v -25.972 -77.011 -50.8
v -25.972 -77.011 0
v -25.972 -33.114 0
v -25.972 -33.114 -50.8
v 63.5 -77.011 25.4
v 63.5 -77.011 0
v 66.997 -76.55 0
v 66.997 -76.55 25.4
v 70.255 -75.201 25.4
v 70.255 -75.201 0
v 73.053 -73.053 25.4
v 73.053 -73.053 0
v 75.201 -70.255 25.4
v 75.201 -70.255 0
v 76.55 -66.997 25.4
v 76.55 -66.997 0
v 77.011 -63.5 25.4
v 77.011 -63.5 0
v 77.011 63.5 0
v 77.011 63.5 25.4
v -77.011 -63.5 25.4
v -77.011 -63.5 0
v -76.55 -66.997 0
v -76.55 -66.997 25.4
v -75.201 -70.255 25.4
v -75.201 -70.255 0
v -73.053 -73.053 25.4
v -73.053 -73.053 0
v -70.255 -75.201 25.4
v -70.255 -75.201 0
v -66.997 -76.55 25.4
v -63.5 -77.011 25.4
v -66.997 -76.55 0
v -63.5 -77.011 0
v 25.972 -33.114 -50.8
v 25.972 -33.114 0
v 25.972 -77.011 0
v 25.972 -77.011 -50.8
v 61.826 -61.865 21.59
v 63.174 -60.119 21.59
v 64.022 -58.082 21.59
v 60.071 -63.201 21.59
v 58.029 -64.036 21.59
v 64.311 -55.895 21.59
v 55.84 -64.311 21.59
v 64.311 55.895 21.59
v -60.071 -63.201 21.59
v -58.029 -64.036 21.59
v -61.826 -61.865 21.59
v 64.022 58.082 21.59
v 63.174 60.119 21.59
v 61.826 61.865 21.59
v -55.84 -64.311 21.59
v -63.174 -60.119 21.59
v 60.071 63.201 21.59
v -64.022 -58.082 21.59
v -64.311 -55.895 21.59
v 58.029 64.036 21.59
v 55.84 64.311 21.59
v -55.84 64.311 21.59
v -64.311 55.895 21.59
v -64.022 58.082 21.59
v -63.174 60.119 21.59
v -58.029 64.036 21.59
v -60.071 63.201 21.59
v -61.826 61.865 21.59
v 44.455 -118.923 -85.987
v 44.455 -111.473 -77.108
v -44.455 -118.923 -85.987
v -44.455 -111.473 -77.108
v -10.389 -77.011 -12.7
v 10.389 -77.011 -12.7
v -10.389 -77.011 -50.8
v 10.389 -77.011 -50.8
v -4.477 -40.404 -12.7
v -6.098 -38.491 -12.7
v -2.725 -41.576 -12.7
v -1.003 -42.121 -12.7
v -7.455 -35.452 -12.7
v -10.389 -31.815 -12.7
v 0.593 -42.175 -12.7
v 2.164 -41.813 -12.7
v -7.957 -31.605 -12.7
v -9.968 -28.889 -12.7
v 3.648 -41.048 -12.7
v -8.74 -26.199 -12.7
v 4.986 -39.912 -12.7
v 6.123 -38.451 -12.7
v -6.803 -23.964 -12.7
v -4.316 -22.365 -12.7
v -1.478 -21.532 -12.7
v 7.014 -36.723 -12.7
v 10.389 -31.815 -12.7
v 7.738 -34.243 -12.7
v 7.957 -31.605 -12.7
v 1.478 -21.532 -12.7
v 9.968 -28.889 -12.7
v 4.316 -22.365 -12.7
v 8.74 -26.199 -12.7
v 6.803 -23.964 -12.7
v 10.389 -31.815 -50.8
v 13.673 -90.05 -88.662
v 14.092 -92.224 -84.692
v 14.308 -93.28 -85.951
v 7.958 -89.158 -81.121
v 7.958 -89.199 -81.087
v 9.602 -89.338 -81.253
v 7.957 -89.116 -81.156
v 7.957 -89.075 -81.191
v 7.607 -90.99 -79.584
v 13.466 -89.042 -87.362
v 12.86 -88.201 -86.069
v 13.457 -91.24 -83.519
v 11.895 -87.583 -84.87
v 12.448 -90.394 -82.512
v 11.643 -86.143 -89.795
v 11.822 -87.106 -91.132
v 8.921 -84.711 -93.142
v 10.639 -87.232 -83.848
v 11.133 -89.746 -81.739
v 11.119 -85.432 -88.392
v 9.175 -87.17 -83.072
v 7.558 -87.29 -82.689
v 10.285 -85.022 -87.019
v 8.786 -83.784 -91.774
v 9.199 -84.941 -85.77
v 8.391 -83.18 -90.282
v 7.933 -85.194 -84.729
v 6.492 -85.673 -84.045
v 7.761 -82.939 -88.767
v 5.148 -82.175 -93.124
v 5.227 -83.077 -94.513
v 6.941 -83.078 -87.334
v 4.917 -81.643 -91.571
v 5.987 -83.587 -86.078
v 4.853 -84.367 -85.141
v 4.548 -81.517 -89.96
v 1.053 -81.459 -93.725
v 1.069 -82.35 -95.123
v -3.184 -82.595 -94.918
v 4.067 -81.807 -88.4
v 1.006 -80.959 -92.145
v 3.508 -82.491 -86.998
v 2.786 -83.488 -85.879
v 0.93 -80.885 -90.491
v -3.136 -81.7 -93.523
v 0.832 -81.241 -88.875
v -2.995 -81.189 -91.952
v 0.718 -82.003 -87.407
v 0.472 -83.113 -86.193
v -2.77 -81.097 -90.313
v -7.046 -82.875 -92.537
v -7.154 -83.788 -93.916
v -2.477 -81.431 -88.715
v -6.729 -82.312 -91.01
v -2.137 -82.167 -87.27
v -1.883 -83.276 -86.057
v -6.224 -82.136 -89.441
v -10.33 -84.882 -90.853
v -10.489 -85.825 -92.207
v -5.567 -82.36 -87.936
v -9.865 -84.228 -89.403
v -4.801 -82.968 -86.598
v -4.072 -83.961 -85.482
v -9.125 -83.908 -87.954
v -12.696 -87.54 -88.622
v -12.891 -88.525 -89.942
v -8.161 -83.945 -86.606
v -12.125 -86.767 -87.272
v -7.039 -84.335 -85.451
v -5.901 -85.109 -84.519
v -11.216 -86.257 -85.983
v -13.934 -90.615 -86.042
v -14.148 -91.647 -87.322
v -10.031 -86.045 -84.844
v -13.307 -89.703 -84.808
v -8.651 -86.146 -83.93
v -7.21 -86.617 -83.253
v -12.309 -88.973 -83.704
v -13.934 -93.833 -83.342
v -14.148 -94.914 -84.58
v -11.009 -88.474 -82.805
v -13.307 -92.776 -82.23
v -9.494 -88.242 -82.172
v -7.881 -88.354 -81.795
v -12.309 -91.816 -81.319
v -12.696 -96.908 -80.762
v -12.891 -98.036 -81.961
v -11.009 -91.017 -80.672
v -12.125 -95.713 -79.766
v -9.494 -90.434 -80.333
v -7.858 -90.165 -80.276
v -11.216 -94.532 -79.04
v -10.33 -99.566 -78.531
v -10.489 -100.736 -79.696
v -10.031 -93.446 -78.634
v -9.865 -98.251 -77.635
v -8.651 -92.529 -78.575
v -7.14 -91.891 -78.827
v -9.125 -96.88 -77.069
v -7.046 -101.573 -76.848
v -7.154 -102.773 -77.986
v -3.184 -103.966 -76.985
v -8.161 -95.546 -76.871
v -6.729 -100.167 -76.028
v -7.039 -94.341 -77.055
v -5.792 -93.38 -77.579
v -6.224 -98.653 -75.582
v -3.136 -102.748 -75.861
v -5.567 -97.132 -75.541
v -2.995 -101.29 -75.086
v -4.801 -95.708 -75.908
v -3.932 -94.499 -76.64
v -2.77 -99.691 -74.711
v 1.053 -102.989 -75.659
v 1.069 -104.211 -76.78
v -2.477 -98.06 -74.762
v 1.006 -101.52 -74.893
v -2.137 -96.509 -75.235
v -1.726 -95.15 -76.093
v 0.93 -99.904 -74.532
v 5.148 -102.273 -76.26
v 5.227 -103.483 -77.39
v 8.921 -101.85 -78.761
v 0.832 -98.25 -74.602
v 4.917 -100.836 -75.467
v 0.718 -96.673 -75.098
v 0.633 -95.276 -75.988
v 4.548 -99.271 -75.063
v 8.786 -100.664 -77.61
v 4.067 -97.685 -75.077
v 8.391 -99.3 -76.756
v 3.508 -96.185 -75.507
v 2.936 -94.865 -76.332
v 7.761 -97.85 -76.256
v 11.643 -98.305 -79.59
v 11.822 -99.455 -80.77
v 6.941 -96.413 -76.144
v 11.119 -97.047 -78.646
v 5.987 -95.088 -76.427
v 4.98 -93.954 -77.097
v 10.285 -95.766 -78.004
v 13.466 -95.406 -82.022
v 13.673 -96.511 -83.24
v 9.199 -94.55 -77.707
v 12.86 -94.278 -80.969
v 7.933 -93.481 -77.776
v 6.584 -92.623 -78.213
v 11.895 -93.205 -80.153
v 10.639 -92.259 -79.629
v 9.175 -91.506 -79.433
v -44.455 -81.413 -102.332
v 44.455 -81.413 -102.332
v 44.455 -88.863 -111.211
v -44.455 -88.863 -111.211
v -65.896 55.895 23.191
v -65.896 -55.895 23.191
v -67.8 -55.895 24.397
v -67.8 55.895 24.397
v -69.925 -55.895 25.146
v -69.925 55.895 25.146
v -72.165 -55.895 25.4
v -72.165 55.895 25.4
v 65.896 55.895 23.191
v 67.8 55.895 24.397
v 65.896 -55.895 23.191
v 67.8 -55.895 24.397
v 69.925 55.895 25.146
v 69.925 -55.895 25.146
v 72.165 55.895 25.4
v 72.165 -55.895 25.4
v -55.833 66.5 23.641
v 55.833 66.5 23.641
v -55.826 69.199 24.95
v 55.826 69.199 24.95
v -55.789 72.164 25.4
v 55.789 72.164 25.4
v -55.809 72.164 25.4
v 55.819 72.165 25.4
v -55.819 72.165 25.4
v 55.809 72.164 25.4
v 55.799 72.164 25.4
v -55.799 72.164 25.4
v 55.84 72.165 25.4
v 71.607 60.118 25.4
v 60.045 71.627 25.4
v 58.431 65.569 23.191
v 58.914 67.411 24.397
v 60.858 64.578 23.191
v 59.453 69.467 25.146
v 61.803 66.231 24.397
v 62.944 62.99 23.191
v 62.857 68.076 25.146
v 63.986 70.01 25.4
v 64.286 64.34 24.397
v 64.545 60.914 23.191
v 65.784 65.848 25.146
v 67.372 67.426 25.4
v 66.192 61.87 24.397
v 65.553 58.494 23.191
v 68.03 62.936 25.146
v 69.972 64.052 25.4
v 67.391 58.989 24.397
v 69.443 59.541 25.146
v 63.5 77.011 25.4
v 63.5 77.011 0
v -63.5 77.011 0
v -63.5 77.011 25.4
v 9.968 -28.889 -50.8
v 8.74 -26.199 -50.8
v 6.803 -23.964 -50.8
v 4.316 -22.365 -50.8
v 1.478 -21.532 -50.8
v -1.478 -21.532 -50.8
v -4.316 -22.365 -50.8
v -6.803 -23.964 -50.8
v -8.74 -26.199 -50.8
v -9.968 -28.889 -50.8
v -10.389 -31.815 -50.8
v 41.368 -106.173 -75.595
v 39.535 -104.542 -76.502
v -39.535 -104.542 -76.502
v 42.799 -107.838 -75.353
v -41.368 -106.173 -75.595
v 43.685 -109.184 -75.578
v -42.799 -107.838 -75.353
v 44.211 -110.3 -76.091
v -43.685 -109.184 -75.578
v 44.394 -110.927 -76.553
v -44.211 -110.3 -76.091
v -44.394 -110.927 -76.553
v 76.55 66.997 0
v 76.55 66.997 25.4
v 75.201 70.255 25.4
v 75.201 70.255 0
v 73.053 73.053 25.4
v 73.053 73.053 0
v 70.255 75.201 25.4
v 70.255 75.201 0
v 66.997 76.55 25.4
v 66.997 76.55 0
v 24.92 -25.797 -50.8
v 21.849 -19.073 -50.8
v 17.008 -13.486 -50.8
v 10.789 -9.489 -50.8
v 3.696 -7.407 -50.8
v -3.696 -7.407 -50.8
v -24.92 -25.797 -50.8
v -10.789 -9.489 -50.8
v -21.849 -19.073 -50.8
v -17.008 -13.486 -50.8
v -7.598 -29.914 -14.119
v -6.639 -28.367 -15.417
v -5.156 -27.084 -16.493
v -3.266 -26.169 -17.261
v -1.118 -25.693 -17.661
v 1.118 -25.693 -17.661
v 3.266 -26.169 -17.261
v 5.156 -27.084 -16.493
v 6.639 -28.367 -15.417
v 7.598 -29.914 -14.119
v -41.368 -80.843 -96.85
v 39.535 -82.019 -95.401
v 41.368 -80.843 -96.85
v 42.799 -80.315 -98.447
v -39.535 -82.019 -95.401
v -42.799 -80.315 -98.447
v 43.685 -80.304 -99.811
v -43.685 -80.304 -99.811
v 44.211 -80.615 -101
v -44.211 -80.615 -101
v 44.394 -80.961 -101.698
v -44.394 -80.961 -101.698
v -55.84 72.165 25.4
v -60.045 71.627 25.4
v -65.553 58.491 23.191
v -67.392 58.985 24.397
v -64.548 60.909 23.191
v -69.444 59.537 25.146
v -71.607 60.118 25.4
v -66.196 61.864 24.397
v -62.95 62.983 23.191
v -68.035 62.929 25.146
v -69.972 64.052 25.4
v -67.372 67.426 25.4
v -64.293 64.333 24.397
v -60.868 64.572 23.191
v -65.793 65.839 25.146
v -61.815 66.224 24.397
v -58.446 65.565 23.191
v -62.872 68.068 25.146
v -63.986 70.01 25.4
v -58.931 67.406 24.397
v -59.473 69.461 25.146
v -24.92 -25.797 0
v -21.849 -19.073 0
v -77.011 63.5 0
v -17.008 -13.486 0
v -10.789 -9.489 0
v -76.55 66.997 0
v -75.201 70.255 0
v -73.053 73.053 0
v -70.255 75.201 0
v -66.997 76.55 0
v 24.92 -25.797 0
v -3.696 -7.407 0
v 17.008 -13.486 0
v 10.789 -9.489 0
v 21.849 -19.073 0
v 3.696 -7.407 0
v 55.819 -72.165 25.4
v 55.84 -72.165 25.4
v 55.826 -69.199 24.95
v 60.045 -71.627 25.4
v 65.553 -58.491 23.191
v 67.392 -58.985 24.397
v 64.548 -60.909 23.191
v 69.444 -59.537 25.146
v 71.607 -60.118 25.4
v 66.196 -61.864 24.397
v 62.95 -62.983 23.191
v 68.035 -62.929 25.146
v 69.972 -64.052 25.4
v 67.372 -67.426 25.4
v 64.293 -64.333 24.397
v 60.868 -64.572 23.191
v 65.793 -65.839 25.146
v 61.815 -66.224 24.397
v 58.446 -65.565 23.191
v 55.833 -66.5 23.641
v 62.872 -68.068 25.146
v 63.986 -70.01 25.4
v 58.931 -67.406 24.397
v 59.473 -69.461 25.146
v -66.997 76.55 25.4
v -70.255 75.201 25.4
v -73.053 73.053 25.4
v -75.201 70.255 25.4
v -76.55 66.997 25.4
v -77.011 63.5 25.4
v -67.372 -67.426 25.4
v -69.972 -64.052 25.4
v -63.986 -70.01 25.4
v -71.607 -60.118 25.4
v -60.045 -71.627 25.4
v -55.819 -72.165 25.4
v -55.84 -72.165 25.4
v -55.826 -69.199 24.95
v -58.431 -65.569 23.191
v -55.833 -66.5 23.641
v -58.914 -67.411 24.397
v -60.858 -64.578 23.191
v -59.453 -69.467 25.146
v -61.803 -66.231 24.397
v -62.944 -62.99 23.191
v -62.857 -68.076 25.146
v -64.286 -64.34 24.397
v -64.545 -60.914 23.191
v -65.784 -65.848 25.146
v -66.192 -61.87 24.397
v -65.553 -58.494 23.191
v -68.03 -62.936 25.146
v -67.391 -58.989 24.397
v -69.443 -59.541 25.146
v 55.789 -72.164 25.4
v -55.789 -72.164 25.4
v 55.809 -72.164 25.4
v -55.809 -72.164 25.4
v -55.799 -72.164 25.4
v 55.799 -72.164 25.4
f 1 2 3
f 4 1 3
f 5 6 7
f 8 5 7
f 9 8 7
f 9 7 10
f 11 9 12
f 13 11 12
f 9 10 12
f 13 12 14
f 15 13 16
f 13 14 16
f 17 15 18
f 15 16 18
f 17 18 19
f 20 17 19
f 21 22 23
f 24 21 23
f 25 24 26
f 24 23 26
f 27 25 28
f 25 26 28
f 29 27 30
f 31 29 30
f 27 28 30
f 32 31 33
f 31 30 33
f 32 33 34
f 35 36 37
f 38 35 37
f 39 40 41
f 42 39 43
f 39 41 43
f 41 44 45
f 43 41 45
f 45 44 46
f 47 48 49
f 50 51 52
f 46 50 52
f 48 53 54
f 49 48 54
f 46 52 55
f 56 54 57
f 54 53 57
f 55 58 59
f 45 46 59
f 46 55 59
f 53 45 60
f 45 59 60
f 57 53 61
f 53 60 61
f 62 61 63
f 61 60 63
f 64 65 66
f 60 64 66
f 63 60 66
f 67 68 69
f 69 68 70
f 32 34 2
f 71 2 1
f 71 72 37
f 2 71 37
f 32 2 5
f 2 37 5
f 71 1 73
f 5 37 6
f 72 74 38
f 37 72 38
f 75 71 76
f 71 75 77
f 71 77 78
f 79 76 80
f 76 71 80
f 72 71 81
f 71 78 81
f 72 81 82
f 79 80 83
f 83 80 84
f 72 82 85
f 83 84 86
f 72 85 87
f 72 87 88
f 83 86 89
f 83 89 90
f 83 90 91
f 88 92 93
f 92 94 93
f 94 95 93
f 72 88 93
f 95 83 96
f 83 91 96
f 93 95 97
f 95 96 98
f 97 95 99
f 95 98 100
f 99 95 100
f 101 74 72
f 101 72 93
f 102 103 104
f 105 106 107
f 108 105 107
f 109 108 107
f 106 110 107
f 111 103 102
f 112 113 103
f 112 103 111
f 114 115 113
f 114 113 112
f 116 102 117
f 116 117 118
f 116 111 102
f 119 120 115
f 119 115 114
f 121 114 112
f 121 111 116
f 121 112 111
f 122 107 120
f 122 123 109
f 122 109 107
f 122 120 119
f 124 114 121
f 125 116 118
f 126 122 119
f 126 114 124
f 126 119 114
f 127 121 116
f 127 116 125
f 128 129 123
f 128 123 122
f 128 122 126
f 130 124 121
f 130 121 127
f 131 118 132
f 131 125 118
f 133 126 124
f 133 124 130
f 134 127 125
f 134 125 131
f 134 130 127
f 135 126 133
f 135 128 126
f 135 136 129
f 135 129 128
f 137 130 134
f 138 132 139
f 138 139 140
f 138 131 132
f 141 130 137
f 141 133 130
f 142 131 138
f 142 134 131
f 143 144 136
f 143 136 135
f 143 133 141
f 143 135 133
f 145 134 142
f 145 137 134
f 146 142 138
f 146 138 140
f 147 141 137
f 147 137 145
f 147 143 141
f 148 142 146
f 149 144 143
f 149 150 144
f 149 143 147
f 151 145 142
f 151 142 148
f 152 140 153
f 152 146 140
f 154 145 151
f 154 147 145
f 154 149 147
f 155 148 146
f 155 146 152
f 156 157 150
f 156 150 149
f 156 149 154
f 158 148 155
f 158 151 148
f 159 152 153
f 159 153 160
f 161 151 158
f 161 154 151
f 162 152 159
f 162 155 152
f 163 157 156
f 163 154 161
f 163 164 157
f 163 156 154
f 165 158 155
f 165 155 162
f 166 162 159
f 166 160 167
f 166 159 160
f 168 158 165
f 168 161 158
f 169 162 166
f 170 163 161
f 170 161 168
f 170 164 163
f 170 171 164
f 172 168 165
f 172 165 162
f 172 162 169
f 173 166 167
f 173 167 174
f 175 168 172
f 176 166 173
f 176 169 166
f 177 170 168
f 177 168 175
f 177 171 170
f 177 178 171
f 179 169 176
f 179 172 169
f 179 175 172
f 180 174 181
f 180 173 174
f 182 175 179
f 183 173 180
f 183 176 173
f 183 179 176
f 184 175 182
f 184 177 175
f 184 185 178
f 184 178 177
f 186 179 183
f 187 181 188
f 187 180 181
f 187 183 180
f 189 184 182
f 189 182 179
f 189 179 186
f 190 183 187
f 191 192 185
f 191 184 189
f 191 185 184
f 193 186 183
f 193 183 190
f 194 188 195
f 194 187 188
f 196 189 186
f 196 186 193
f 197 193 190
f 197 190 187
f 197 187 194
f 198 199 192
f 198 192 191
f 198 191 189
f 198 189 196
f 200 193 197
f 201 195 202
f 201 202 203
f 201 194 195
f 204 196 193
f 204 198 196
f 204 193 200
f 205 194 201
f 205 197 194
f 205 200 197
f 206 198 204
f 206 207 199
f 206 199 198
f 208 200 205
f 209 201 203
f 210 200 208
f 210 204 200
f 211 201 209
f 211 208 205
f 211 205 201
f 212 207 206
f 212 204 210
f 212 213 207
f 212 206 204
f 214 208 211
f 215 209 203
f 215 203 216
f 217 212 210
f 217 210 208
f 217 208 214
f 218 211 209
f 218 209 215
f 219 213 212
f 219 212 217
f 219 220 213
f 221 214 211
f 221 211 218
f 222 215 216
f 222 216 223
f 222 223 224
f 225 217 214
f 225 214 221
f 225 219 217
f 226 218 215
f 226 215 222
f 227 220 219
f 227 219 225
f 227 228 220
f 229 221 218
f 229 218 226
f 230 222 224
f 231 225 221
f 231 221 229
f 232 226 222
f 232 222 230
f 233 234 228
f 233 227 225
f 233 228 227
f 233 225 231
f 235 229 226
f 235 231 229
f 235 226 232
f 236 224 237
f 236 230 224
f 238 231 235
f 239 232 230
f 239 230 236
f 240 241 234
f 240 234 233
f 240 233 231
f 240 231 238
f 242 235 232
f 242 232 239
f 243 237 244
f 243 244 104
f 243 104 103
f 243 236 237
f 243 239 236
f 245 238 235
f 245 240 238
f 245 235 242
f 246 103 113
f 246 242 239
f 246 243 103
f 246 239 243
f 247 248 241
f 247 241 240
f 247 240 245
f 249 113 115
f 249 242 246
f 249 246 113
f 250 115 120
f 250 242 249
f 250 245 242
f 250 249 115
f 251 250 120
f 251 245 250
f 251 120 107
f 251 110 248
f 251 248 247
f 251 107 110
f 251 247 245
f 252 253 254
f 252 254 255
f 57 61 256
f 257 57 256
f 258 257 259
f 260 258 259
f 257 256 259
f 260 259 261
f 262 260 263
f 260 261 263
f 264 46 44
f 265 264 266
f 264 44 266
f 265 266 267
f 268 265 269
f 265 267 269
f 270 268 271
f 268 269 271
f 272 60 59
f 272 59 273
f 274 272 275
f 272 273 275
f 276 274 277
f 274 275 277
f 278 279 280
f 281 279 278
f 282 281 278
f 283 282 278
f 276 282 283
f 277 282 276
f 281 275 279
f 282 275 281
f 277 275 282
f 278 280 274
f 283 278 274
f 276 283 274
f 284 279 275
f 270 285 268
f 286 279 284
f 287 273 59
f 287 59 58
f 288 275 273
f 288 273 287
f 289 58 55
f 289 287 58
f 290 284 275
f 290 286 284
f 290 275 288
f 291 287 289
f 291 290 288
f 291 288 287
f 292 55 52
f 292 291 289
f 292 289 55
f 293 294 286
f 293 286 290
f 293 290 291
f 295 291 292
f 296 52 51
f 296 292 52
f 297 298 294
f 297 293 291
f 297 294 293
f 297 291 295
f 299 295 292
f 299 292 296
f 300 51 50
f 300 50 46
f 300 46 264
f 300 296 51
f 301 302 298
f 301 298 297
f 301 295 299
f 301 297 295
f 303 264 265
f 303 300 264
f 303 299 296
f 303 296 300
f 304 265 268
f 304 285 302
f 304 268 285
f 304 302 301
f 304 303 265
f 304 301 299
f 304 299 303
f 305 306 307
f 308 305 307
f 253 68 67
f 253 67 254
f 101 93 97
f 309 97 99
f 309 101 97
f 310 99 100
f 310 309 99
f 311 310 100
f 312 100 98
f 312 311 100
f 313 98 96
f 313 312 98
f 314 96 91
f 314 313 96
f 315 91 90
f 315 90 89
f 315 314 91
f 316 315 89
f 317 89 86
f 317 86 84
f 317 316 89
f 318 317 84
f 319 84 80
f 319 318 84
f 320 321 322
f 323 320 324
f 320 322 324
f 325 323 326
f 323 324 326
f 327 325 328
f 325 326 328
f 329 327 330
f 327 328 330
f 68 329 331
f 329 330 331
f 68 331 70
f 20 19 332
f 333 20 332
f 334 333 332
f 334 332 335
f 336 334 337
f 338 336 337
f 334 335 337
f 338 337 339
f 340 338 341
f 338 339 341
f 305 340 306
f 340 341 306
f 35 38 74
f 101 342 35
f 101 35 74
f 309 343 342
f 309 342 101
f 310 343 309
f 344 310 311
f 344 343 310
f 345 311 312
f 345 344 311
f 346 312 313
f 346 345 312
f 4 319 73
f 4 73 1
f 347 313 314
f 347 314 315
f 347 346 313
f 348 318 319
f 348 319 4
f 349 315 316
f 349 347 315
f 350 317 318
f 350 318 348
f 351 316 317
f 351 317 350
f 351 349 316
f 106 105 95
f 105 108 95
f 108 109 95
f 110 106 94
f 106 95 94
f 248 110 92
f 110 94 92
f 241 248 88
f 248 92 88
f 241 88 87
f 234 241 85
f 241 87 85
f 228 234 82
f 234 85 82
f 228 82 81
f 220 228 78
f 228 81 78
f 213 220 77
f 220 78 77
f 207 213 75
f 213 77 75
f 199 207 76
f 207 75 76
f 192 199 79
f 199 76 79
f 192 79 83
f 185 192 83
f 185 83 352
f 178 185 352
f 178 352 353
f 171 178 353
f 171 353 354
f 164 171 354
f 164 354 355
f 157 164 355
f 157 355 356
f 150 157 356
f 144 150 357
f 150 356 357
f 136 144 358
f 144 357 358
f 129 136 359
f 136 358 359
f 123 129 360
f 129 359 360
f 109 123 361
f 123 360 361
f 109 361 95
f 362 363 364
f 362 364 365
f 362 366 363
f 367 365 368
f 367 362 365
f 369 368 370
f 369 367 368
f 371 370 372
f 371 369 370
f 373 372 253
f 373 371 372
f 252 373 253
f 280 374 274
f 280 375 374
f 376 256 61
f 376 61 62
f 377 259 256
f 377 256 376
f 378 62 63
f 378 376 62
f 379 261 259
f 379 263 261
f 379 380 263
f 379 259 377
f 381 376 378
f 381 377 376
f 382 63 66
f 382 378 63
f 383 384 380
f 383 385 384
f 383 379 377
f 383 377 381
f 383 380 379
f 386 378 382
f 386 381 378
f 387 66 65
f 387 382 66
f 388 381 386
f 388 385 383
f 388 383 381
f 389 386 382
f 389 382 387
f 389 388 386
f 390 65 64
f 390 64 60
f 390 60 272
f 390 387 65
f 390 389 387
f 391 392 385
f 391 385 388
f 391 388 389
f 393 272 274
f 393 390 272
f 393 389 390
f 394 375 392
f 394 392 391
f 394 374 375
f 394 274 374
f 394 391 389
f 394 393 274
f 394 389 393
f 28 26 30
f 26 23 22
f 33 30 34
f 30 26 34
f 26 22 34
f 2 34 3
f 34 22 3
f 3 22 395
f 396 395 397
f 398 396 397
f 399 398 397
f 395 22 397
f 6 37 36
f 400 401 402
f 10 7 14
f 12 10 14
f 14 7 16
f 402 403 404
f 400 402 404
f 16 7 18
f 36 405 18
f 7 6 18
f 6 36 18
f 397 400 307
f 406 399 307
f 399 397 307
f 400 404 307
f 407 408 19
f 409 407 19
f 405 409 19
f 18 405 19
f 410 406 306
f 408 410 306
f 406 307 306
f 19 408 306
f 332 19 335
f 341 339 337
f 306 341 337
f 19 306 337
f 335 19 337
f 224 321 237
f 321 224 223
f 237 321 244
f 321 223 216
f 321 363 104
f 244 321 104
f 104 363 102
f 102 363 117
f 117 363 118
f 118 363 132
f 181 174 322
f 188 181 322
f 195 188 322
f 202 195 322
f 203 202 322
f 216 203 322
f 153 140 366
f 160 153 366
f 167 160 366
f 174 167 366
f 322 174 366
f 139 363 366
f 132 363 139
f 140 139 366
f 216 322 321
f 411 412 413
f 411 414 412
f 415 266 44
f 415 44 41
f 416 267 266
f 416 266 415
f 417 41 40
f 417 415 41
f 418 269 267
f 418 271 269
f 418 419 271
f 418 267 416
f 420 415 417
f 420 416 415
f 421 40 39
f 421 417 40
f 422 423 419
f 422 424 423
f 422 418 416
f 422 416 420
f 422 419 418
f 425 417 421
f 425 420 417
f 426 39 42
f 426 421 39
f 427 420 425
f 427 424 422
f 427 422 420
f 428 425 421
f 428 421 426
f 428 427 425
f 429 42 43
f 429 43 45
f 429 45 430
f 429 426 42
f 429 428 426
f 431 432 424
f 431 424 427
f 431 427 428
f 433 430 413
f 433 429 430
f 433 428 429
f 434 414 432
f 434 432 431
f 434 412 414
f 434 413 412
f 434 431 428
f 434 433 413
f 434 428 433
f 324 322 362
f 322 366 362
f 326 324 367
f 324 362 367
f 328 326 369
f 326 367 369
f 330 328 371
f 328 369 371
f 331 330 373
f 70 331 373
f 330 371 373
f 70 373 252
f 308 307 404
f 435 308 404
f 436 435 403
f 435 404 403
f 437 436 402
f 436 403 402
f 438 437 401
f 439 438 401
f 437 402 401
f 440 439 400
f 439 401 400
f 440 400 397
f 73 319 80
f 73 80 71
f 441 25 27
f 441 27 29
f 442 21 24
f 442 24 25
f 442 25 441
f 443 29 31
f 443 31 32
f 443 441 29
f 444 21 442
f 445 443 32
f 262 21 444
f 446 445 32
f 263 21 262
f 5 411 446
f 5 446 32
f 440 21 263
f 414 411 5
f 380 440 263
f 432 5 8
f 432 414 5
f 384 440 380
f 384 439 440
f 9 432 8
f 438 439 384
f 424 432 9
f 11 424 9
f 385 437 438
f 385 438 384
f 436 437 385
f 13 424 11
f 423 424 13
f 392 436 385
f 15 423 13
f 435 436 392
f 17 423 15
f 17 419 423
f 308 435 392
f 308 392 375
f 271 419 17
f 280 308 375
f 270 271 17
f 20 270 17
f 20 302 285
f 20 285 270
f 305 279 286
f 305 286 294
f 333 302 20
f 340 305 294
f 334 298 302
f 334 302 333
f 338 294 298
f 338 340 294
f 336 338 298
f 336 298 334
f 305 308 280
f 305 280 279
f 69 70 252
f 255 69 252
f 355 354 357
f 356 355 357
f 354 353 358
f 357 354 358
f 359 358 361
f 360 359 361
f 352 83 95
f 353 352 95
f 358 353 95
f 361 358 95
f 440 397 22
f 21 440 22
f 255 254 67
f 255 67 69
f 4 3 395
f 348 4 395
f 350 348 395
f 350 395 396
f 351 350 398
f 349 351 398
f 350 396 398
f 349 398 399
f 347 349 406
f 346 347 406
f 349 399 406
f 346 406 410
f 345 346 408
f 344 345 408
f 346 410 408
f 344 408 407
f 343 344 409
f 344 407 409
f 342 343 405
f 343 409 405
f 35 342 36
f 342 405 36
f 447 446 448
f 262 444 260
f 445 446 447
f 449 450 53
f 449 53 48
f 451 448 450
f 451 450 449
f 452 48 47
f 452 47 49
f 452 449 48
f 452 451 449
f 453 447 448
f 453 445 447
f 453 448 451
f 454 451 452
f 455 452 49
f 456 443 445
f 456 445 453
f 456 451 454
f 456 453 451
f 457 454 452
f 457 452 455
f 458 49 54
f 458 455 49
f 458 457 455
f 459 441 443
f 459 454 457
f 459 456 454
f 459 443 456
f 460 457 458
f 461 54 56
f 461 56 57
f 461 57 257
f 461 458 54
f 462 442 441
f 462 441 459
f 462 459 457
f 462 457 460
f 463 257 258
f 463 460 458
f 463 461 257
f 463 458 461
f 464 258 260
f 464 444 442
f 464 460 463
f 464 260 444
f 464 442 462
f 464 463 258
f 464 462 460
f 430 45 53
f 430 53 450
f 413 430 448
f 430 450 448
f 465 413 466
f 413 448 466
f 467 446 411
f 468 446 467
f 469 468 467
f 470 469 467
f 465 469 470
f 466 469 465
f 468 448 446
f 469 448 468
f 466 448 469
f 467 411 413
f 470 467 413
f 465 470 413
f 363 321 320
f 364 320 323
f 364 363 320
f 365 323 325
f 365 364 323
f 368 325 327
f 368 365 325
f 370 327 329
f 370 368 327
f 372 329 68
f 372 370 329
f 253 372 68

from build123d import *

# Parameters (mm, degrees)
BOSS_EXTRUDE1_DEPTH     = 25.4
CUT_EXTRUDE1_DEPTH      = 0.25399999999999945
CUT_EXTRUDE1_DEPTH_BACK = 3.8099999999999814
BOSS_EXTRUDE3_DEPTH     = 50.8
CUT_EXTRUDE3_DEPTH      = 38.1
SKETCH9_R               = 7.958201772862371
BOSS_EXTRUDE4_DEPTH     = 95.75799999999995
SKETCH11_W              = 88.91089611657237
SKETCH11_H              = 39.241441418777725
BOSS_EXTRUDE5_DEPTH     = 16.509999999999938
FILLET2_R               = 10
FILLET3_R               = 4.919999999999999


# Read off the part's stored shape, not the designer's step: Sweep1
with BuildPart() as part:
    # Sketch1 → Boss-Extrude1 (new body)
    with BuildSketch(Plane.XY):
        with BuildLine():
            Line((63.5, 77.01063829787236), (-63.5, 77.01063829787236))
            ThreePointArc((-63.5, 77.01063829787236), (-73.05346395858422, 73.05346395858422), (-77.01063829787236, 63.5))
            Line((-77.01063829787236, 63.5), (-77.01063829787236, -63.5))
            ThreePointArc((-77.01063829787236, -63.5), (-73.05346395858422, -73.05346395858422), (-63.5, -77.01063829787236))
            Line((-63.5, -77.01063829787236), (63.5, -77.01063829787236))
            ThreePointArc((63.5, -77.01063829787236), (73.05346395858422, -73.05346395858423), (77.01063829787236, -63.500000000000014))
            Line((77.01063829787236, -63.500000000000014), (77.01063829787236, 63.500000000000014))
            ThreePointArc((77.01063829787236, 63.500000000000014), (73.05346395858422, 73.05346395858423), (63.5, 77.01063829787236))
        make_face()
    extrude(amount=BOSS_EXTRUDE1_DEPTH)

    # Sketch3 → Cut-Extrude1 (cut, two sides: drawn at the far end of the back side and taken through both)
    with BuildSketch(Plane.XY.offset(25.4).offset(-CUT_EXTRUDE1_DEPTH_BACK)):
        with BuildLine():
            Line((-64.31063829787236, -55.89490495185724), (-64.31063829787236, 55.89490495185724))
            ThreePointArc((-64.31063829787236, 55.89490495185724), (-61.826342998624284, 61.86512188051967), (-55.84013695793273, 64.31063829787234))
            Line((-55.84013695793273, 64.31063829787234), (55.84013695793273, 64.31063829787234))
            ThreePointArc((55.84013695793273, 64.31063829787234), (61.826342998624284, 61.86512188051967), (64.31063829787236, 55.89490495185724))
            Line((64.31063829787236, 55.89490495185724), (64.31063829787236, -55.89490495185724))
            ThreePointArc((64.31063829787236, -55.89490495185724), (61.826342998624284, -61.86512188051967), (55.84013695793273, -64.31063829787234))
            Line((55.84013695793273, -64.31063829787234), (-55.84013695793273, -64.31063829787234))
            ThreePointArc((-55.84013695793273, -64.31063829787234), (-61.826342998624284, -61.86512188051967), (-64.31063829787236, -55.89490495185724))
        make_face()
    extrude(amount=CUT_EXTRUDE1_DEPTH + CUT_EXTRUDE1_DEPTH_BACK, mode=Mode.SUBTRACT)

    # Sketch7 → Boss-Extrude3 (add)
    with BuildSketch(Plane(origin=(0, 0, 0), x_dir=(-1, 0, 0), z_dir=(0, 0, -1))):
        with BuildLine():
            Line((-25.971736510678774, -77.01063829787236), (25.971736510678774, -77.0106382978723))
            Line((25.971736510678774, -77.0106382978723), (25.971736510678774, -33.11396405111534))
            ThreePointArc((25.971736510678774, -33.11396405111534), (-4.77e-15, -7.142227540436579), (-25.971736510678774, -33.11396405111537))
            Line((-25.971736510678774, -33.11396405111537), (-25.971736510678774, -77.01063829787236))
        make_face()
    extrude(amount=BOSS_EXTRUDE3_DEPTH)

    # Sketch8 → Cut-Extrude3 (cut)
    with BuildSketch(Plane(origin=(0, 0, -50.8), x_dir=(-1, 0, 0), z_dir=(0, 0, -1))):
        with BuildLine():
            Line((-10.388694604271498, -77.01063829787235), (-10.388694604271498, -31.815377225581233))
            ThreePointArc((-10.388694604271498, -31.815377225581233), (6.4e-16, -21.426682621309737), (10.388694604271498, -31.815377225581233))
            Line((10.388694604271498, -31.815377225581233), (10.388694604271498, -77.01063829787235))
            Line((10.388694604271498, -77.01063829787235), (-10.388694604271498, -77.01063829787235))
        make_face()
    extrude(amount=-CUT_EXTRUDE3_DEPTH, mode=Mode.SUBTRACT)

    # Sketch9 → Boss-Extrude4 (add)
    with BuildSketch(Plane(origin=(0, -19.311882184983943, -23.015004973711303), x_dir=(1, 0, 0), z_dir=(0, -0.6427876096865301, -0.7660444431189859))):
        with Locations(Location((0, 16.20859028637191, 0), (0, 0, 358.83868965))):
            Circle(SKETCH9_R)
    extrude(amount=BOSS_EXTRUDE4_DEPTH)



with BuildPart() as body_2:
    # Sketch11 → Boss-Extrude5 (new body)
    with BuildSketch(Plane(origin=(0, -80.86393811334668, -96.36988875789913), x_dir=(-1, 0, 0), z_dir=(0, -0.64278760968653, -0.766044443118986))):
        with Locations((0, -16.2085902863719)):
            Rectangle(SKETCH11_W, SKETCH11_H)
    extrude(amount=BOSS_EXTRUDE5_DEPTH)


with BuildPart() as part_1:
    add(part.part)

    add(body_2.part)  # Sweep1 merges body 2
    # Sweep1 outline → Sweep1 (revolve)
    with BuildSketch(Plane(origin=(0, -12.41650052, 10.418681007), x_dir=(1, 0, 0), z_dir=(0, -0.766044443118986, 0.64278760968653))):
        with BuildLine():
            ThreePointArc((14.308201773, -125.801955257), (12.448329834, -121.311827197), (7.958201773, -119.451955257))
            Line((7.958201773, -119.451955257), (7.958201773, -125.801955257))
            Line((7.958201773, -125.801955257), (14.308201773, -125.801955257))
        make_face()
    revolve(axis=Axis((0, -12.41650052, 10.418681007), (0, 0.64278760968653, 0.766044443118986)))

    # Fillet2
    # the kernel refuses this fillet: 10 mm, written as the material it takes off along each edge
    with BuildSketch(Plane(origin=(-55.894727894264214, 55.894904951857264, 25.4), x_dir=(-1, -2.53e-15, 0), z_dir=(2.53e-15, -1, 0))) as fillet2_piece_1:
        with BuildLine():
            CenterArc((16.269820257941824, 10), FILLET2_R, 218.24314589443497, 51.756854105565026)
            Line((8.415910403608144, 3.809999999999981), (8.258832206521468, 3.6861999999999817))
            ThreePointArc((8.258832206521468, 3.6861999999999817), (8.215910403608142, 1.9049999999999905), (8.215910403608142, 0))
            Line((8.215910403608142, 0), (8.415910403608144, -0.1999999999999993))
            Line((8.415910403608144, -0.1999999999999993), (16.269820257941824, -0.1999999999999993))
            Line((16.269820257941824, -0.1999999999999993), (16.269820257941824, 0))
        make_face()
    revolve(axis=Axis((-55.894727894264214, 55.894904951857264, 25.4), (0, 0, -1)), revolution_arc=90.37165939708579, mode=Mode.SUBTRACT)
    with BuildSketch(Plane(origin=(55.894727894264214, 55.894904951857264, 25.4), x_dir=(-0.00648663468518885, 0.9999789615639225, 0), z_dir=(-0.9999789615639225, -0.00648663468518885, 0))) as fillet2_piece_2:
        with BuildLine():
            CenterArc((16.269820257941824, 10), FILLET2_R, 218.24314589443495, 51.756854105565026)
            Line((8.415910403608141, 3.809999999999981), (8.258832206521465, 3.6861999999999817))
            ThreePointArc((8.258832206521465, 3.6861999999999817), (8.215910403608135, 1.9049999999999905), (8.215910403608135, 0))
            Line((8.215910403608135, 0), (8.415910403608141, -0.1999999999999993))
            Line((8.415910403608141, -0.1999999999999993), (16.269820257941824, -0.1999999999999993))
            Line((16.269820257941824, -0.1999999999999993), (16.269820257941824, 0))
        make_face()
    revolve(axis=Axis((55.894727894264214, 55.894904951857264, 25.4), (0, 0, -1)), revolution_arc=90.37165939708579, mode=Mode.SUBTRACT)
    with BuildSketch(Plane(origin=(64.31063829787236, -55.894904951857235, 25.4), x_dir=(1, 0, 0), z_dir=(0, 1, 0)), Plane(origin=(-64.31063829787236, 55.894904951857235, 25.4), x_dir=(-1, 0, 0), z_dir=(0, -1, 0))) as fillet2_piece_3:
        with BuildLine():
            CenterArc((7.853909854333679, 10), FILLET2_R, 218.24314589443497, 51.756854105565026)
            Line((0, 3.809999999999981), (-0.15707819708667614, 3.6861999999999817))
            ThreePointArc((-0.15707819708667614, 3.6861999999999817), (-0.20000000000000284, 1.9049999999999905), (-0.20000000000000284, 0))
            Line((-0.20000000000000284, 0), (0, -0.1999999999999993))
            Line((0, -0.1999999999999993), (7.853909854333679, -0.1999999999999993))
            Line((7.853909854333679, -0.1999999999999993), (7.853909854333679, 0))
        make_face()
    extrude(amount=111.78980990371448, mode=Mode.SUBTRACT)
    with BuildSketch(Plane(origin=(55.894727894264214, -55.894904951857264, 25.4), x_dir=(1, 2.53e-15, 0), z_dir=(-2.53e-15, 1, 0))) as fillet2_piece_4:
        with BuildLine():
            CenterArc((16.269820257941824, 10), FILLET2_R, 218.24314589443497, 51.756854105565026)
            Line((8.415910403608144, 3.809999999999981), (8.258832206521468, 3.6861999999999817))
            ThreePointArc((8.258832206521468, 3.6861999999999817), (8.215910403608142, 1.9049999999999905), (8.215910403608142, 0))
            Line((8.215910403608142, 0), (8.415910403608144, -0.1999999999999993))
            Line((8.415910403608144, -0.1999999999999993), (16.269820257941824, -0.1999999999999993))
            Line((16.269820257941824, -0.1999999999999993), (16.269820257941824, 0))
        make_face()
    revolve(axis=Axis((55.894727894264214, -55.894904951857264, 25.4), (0, 0, -1)), revolution_arc=90.37165939708579, mode=Mode.SUBTRACT)
    with BuildSketch(Plane(origin=(-55.840136957932735, -64.31063829787234, 25.4), x_dir=(0, -1, 0), z_dir=(1, 0, 0)), Plane(origin=(55.840136957932735, 64.31063829787234, 25.4), x_dir=(0, 1, 0), z_dir=(-1, 0, 0))) as fillet2_piece_5:
        with BuildLine():
            CenterArc((7.853909854333679, 10), FILLET2_R, 218.24314589443497, 51.756854105565026)
            Line((0, 3.809999999999981), (-0.15707819708667614, 3.6861999999999817))
            ThreePointArc((-0.15707819708667614, 3.6861999999999817), (-0.20000000000000284, 1.9049999999999905), (-0.20000000000000284, 0))
            Line((-0.20000000000000284, 0), (0, -0.1999999999999993))
            Line((0, -0.1999999999999993), (7.853909854333679, -0.1999999999999993))
            Line((7.853909854333679, -0.1999999999999993), (7.853909854333679, 0))
        make_face()
    extrude(amount=111.68027391586546, mode=Mode.SUBTRACT)
    with BuildSketch(Plane(origin=(-55.894727894264214, -55.894904951857264, 25.4), x_dir=(0.00648663468518885, -0.9999789615639225, 0), z_dir=(0.9999789615639225, 0.00648663468518885, 0))) as fillet2_piece_6:
        with BuildLine():
            CenterArc((16.269820257941824, 10), FILLET2_R, 218.24314589443495, 51.756854105565026)
            Line((8.415910403608141, 3.809999999999981), (8.258832206521465, 3.6861999999999817))
            ThreePointArc((8.258832206521465, 3.6861999999999817), (8.215910403608135, 1.9049999999999905), (8.215910403608135, 0))
            Line((8.215910403608135, 0), (8.415910403608141, -0.1999999999999993))
            Line((8.415910403608141, -0.1999999999999993), (16.269820257941824, -0.1999999999999993))
            Line((16.269820257941824, -0.1999999999999993), (16.269820257941824, 0))
        make_face()
    revolve(axis=Axis((-55.894727894264214, -55.894904951857264, 25.4), (0, 0, -1)), revolution_arc=90.37165939708579, mode=Mode.SUBTRACT)

    # Fillet3
    fillet3_edges = [part_1.edges().sort_by_distance(p)[0] for p in [
        (-44.45544805828619, -93.28043863301424, -85.95120775133383),
        (0, -78.2500945635973, -98.5631639164489),
        (44.45544805828619, -93.28043863301424, -85.95120775133383),
        (0, -108.3107827024312, -73.33925158621877),
    ]]
    fillet(fillet3_edges, radius=FILLET3_R)


solid = part_1.part
